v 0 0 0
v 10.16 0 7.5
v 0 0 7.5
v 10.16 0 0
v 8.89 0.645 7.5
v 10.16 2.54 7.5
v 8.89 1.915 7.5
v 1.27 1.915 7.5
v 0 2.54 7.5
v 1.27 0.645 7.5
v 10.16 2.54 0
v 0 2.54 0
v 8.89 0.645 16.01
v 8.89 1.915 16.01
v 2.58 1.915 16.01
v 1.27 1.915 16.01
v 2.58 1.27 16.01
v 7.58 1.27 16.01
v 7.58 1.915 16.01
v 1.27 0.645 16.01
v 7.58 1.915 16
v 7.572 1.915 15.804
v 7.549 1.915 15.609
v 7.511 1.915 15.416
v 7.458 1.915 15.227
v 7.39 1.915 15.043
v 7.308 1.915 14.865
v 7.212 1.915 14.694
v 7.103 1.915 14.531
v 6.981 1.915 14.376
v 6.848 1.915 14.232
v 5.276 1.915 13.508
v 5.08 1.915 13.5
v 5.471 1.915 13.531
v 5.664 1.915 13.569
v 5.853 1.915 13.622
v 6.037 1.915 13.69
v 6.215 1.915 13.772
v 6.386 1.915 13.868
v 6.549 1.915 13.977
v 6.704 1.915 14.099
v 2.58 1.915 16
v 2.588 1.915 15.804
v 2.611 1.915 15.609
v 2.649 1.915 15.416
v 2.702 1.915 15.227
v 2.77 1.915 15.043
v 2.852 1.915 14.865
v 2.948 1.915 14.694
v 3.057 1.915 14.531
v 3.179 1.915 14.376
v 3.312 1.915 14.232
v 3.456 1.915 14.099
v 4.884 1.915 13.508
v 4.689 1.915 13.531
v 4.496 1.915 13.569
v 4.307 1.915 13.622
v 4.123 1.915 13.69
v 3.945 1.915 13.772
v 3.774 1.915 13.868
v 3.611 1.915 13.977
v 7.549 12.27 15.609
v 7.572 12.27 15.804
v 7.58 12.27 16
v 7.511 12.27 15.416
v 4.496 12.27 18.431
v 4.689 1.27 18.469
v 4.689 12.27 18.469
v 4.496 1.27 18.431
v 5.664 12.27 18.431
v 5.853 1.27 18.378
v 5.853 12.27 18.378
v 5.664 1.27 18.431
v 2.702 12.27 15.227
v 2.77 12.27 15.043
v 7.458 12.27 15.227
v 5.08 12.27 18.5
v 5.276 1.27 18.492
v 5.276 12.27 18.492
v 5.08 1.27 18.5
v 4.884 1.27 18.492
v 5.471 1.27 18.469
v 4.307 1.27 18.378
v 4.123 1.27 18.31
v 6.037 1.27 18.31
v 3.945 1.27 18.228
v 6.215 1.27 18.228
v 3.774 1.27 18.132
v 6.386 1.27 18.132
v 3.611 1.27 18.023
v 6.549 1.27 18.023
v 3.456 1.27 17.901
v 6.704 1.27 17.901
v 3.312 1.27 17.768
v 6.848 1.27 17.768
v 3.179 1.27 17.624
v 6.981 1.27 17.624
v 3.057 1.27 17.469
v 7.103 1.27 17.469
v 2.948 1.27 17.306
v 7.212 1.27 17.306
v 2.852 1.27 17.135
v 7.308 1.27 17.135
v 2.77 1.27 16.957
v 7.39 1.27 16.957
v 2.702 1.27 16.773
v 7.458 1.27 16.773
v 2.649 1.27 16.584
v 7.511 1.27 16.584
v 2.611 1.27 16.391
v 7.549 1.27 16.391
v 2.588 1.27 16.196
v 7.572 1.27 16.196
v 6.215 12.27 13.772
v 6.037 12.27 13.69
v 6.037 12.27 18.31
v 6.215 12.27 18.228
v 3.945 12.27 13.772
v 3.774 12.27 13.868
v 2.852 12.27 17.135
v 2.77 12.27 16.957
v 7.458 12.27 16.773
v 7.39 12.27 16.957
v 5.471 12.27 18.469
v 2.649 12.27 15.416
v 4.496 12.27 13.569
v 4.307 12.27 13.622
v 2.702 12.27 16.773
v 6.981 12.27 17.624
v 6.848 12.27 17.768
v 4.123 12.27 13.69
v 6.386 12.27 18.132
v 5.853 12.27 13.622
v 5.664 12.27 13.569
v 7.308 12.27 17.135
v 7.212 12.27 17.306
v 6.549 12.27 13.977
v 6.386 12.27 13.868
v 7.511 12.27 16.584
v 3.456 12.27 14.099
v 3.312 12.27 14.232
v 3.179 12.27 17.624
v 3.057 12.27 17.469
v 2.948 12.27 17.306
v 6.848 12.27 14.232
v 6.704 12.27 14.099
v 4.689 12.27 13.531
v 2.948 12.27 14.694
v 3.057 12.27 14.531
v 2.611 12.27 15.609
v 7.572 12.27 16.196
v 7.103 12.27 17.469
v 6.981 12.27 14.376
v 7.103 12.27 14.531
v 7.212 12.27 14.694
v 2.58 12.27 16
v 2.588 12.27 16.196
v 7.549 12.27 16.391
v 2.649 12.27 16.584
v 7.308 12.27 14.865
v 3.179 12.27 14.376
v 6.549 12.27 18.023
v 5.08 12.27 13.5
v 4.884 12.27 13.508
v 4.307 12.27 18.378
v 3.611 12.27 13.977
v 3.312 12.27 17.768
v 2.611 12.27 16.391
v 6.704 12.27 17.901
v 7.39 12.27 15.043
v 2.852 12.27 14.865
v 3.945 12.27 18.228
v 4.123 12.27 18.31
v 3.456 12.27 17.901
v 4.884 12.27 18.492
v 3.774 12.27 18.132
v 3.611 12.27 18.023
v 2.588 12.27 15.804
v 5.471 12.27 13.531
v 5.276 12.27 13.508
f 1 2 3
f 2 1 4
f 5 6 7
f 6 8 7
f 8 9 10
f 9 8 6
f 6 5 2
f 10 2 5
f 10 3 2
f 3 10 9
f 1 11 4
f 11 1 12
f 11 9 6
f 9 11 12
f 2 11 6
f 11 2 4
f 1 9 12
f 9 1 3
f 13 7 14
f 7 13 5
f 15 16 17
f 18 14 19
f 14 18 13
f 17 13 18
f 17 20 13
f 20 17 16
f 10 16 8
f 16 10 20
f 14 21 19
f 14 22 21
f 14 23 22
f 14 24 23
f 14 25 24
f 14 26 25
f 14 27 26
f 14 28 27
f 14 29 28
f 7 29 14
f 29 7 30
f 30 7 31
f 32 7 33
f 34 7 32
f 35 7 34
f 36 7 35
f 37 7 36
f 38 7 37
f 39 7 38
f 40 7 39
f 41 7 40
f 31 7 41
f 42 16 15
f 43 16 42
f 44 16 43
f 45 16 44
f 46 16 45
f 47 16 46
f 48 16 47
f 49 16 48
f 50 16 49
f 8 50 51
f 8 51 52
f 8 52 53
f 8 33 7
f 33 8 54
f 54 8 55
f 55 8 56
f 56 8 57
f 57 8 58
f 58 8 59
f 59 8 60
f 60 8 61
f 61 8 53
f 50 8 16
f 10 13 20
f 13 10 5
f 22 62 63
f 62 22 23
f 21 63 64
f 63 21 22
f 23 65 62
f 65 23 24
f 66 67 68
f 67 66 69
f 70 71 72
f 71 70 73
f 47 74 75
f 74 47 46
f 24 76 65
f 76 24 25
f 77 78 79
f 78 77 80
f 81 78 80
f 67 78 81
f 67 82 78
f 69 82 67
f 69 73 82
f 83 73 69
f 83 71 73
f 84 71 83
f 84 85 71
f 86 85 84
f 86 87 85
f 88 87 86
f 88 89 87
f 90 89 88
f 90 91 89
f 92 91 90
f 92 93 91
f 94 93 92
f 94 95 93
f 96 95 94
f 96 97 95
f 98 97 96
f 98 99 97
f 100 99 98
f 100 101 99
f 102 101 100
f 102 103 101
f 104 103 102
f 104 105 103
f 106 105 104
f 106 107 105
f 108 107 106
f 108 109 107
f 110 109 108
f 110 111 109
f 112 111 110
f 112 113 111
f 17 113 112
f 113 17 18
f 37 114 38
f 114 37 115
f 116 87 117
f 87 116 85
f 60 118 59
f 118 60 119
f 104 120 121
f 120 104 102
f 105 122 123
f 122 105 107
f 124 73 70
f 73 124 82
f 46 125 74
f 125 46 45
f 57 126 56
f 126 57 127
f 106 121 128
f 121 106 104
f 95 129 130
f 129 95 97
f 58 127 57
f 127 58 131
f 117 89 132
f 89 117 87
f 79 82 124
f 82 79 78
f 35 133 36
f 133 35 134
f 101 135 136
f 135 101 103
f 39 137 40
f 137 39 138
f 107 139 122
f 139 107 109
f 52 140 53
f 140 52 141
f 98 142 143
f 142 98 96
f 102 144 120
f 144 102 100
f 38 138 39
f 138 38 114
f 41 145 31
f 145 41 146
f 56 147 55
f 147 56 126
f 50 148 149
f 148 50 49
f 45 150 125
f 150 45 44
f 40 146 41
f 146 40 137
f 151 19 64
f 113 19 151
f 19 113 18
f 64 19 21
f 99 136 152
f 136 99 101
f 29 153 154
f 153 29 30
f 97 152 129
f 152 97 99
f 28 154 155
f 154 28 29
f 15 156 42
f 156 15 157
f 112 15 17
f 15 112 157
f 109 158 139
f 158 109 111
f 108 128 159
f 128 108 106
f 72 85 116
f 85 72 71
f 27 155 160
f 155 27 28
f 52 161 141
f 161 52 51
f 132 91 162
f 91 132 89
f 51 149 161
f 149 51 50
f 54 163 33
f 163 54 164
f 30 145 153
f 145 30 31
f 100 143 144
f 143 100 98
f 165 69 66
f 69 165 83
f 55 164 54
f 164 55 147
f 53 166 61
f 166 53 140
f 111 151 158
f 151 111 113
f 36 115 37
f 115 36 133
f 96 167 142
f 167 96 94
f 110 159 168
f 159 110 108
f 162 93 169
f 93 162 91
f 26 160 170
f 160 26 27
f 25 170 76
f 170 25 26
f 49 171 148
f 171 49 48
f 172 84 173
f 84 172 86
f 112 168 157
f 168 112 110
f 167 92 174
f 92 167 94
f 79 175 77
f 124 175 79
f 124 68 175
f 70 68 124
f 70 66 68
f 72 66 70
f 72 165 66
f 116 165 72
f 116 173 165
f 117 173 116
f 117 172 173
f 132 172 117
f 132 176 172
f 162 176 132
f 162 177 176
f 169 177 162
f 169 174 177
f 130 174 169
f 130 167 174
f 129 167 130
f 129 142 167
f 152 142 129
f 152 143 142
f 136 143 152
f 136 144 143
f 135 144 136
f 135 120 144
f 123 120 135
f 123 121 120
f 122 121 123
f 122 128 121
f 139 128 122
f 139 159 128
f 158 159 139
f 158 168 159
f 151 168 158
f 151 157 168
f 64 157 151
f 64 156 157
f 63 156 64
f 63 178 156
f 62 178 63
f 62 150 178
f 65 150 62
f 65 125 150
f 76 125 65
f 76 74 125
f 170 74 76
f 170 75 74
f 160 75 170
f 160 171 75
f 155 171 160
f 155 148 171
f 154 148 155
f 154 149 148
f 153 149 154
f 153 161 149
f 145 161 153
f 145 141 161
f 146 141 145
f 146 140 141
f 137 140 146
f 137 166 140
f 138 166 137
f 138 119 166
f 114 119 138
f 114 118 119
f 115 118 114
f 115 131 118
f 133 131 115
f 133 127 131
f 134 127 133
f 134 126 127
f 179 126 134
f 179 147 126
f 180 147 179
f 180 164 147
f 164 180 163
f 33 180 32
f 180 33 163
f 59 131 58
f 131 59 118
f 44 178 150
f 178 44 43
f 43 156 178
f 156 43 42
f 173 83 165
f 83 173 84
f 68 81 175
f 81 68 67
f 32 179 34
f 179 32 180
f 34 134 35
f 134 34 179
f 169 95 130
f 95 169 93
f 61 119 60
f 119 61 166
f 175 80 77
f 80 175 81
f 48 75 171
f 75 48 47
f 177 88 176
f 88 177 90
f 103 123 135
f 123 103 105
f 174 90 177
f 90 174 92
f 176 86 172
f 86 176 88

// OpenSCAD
// file: ../lib/pins.scad
module socket(count, spacing=2.54)
{
    // Component-specific parameters
    socket_color = "black";
    socket_z = 7.5;

    pin_color = "lightgray";
    pin_radius = spacing/4;
    pin_z = 2;


    // Solder pin
    // color(pin_color)
    // translate([spacing/2, spacing/2, -pin_z])
    // cylinder(
    //         r = pin_radius,
    //         h = pin_z + nothing
    //     );

    // Socket
    color(socket_color)
    translate([-spacing/2, 0, 0])
    cube([spacing, count*spacing, socket_z]);
}


module pins(count, spacing=2.54)
{
    socket(count, spacing);

    // TODO...
}
// file: config.scad
// Rendering: Level of detail
$fn = 80;

// Quickfix for rendering artifacts on overlapping surfaces
nothing = 0.01;

/*
 * Globally relevant model parameters
 */
adapter_pcb_size_x = 26;
adapter_pcb_size_y = 29;
adapter_pcb_size_z = 1.0;
adapter_pin_spacing = 2.54;

sensor_pcb_size_x = 20;
sensor_pcb_size_y = 20;
sensor_pcb_size_z = 1.0;

led_socket_pin_spacing = 2.54;
led_socket_pin_count = 4;
led_socket_size_x = led_socket_pin_count * led_socket_pin_spacing;
led_diameter = 5.0;
// main file
include <config.scad>;
use <../lib/pins.scad>;


/**
 * Socket for a three-color LED (4 terminals)
 * including the LED, angled 90 degrees
 */
module light_source(
            // Pins
            pin_color = "silver",
            pin_spacing = led_socket_pin_spacing,
            pin_count = led_socket_pin_count,

            // LED
            led_color = "red",
            led_d = led_diameter,
            led_h = 11.0,
            led_z = 16.0
        )
{
    led_x = pin_count/2 * pin_spacing;

    // Pin socket
    translate([0, pin_spacing/2, 0])
    rotate([0, 0, -90])
    pins(count=pin_count, spacing=pin_spacing);

    // LED pins
    color(pin_color)
    translate([pin_spacing/2, pin_spacing/4 + nothing, nothing])
    cube([3*pin_spacing, pin_spacing/2, led_z]);

    // LED body
    color(led_color)
    translate([led_x, pin_spacing/2, led_z])
    rotate([-90, 0, 0])
    cylinder(
        r = led_d/2,
        h = led_h
    );
}

light_source();
